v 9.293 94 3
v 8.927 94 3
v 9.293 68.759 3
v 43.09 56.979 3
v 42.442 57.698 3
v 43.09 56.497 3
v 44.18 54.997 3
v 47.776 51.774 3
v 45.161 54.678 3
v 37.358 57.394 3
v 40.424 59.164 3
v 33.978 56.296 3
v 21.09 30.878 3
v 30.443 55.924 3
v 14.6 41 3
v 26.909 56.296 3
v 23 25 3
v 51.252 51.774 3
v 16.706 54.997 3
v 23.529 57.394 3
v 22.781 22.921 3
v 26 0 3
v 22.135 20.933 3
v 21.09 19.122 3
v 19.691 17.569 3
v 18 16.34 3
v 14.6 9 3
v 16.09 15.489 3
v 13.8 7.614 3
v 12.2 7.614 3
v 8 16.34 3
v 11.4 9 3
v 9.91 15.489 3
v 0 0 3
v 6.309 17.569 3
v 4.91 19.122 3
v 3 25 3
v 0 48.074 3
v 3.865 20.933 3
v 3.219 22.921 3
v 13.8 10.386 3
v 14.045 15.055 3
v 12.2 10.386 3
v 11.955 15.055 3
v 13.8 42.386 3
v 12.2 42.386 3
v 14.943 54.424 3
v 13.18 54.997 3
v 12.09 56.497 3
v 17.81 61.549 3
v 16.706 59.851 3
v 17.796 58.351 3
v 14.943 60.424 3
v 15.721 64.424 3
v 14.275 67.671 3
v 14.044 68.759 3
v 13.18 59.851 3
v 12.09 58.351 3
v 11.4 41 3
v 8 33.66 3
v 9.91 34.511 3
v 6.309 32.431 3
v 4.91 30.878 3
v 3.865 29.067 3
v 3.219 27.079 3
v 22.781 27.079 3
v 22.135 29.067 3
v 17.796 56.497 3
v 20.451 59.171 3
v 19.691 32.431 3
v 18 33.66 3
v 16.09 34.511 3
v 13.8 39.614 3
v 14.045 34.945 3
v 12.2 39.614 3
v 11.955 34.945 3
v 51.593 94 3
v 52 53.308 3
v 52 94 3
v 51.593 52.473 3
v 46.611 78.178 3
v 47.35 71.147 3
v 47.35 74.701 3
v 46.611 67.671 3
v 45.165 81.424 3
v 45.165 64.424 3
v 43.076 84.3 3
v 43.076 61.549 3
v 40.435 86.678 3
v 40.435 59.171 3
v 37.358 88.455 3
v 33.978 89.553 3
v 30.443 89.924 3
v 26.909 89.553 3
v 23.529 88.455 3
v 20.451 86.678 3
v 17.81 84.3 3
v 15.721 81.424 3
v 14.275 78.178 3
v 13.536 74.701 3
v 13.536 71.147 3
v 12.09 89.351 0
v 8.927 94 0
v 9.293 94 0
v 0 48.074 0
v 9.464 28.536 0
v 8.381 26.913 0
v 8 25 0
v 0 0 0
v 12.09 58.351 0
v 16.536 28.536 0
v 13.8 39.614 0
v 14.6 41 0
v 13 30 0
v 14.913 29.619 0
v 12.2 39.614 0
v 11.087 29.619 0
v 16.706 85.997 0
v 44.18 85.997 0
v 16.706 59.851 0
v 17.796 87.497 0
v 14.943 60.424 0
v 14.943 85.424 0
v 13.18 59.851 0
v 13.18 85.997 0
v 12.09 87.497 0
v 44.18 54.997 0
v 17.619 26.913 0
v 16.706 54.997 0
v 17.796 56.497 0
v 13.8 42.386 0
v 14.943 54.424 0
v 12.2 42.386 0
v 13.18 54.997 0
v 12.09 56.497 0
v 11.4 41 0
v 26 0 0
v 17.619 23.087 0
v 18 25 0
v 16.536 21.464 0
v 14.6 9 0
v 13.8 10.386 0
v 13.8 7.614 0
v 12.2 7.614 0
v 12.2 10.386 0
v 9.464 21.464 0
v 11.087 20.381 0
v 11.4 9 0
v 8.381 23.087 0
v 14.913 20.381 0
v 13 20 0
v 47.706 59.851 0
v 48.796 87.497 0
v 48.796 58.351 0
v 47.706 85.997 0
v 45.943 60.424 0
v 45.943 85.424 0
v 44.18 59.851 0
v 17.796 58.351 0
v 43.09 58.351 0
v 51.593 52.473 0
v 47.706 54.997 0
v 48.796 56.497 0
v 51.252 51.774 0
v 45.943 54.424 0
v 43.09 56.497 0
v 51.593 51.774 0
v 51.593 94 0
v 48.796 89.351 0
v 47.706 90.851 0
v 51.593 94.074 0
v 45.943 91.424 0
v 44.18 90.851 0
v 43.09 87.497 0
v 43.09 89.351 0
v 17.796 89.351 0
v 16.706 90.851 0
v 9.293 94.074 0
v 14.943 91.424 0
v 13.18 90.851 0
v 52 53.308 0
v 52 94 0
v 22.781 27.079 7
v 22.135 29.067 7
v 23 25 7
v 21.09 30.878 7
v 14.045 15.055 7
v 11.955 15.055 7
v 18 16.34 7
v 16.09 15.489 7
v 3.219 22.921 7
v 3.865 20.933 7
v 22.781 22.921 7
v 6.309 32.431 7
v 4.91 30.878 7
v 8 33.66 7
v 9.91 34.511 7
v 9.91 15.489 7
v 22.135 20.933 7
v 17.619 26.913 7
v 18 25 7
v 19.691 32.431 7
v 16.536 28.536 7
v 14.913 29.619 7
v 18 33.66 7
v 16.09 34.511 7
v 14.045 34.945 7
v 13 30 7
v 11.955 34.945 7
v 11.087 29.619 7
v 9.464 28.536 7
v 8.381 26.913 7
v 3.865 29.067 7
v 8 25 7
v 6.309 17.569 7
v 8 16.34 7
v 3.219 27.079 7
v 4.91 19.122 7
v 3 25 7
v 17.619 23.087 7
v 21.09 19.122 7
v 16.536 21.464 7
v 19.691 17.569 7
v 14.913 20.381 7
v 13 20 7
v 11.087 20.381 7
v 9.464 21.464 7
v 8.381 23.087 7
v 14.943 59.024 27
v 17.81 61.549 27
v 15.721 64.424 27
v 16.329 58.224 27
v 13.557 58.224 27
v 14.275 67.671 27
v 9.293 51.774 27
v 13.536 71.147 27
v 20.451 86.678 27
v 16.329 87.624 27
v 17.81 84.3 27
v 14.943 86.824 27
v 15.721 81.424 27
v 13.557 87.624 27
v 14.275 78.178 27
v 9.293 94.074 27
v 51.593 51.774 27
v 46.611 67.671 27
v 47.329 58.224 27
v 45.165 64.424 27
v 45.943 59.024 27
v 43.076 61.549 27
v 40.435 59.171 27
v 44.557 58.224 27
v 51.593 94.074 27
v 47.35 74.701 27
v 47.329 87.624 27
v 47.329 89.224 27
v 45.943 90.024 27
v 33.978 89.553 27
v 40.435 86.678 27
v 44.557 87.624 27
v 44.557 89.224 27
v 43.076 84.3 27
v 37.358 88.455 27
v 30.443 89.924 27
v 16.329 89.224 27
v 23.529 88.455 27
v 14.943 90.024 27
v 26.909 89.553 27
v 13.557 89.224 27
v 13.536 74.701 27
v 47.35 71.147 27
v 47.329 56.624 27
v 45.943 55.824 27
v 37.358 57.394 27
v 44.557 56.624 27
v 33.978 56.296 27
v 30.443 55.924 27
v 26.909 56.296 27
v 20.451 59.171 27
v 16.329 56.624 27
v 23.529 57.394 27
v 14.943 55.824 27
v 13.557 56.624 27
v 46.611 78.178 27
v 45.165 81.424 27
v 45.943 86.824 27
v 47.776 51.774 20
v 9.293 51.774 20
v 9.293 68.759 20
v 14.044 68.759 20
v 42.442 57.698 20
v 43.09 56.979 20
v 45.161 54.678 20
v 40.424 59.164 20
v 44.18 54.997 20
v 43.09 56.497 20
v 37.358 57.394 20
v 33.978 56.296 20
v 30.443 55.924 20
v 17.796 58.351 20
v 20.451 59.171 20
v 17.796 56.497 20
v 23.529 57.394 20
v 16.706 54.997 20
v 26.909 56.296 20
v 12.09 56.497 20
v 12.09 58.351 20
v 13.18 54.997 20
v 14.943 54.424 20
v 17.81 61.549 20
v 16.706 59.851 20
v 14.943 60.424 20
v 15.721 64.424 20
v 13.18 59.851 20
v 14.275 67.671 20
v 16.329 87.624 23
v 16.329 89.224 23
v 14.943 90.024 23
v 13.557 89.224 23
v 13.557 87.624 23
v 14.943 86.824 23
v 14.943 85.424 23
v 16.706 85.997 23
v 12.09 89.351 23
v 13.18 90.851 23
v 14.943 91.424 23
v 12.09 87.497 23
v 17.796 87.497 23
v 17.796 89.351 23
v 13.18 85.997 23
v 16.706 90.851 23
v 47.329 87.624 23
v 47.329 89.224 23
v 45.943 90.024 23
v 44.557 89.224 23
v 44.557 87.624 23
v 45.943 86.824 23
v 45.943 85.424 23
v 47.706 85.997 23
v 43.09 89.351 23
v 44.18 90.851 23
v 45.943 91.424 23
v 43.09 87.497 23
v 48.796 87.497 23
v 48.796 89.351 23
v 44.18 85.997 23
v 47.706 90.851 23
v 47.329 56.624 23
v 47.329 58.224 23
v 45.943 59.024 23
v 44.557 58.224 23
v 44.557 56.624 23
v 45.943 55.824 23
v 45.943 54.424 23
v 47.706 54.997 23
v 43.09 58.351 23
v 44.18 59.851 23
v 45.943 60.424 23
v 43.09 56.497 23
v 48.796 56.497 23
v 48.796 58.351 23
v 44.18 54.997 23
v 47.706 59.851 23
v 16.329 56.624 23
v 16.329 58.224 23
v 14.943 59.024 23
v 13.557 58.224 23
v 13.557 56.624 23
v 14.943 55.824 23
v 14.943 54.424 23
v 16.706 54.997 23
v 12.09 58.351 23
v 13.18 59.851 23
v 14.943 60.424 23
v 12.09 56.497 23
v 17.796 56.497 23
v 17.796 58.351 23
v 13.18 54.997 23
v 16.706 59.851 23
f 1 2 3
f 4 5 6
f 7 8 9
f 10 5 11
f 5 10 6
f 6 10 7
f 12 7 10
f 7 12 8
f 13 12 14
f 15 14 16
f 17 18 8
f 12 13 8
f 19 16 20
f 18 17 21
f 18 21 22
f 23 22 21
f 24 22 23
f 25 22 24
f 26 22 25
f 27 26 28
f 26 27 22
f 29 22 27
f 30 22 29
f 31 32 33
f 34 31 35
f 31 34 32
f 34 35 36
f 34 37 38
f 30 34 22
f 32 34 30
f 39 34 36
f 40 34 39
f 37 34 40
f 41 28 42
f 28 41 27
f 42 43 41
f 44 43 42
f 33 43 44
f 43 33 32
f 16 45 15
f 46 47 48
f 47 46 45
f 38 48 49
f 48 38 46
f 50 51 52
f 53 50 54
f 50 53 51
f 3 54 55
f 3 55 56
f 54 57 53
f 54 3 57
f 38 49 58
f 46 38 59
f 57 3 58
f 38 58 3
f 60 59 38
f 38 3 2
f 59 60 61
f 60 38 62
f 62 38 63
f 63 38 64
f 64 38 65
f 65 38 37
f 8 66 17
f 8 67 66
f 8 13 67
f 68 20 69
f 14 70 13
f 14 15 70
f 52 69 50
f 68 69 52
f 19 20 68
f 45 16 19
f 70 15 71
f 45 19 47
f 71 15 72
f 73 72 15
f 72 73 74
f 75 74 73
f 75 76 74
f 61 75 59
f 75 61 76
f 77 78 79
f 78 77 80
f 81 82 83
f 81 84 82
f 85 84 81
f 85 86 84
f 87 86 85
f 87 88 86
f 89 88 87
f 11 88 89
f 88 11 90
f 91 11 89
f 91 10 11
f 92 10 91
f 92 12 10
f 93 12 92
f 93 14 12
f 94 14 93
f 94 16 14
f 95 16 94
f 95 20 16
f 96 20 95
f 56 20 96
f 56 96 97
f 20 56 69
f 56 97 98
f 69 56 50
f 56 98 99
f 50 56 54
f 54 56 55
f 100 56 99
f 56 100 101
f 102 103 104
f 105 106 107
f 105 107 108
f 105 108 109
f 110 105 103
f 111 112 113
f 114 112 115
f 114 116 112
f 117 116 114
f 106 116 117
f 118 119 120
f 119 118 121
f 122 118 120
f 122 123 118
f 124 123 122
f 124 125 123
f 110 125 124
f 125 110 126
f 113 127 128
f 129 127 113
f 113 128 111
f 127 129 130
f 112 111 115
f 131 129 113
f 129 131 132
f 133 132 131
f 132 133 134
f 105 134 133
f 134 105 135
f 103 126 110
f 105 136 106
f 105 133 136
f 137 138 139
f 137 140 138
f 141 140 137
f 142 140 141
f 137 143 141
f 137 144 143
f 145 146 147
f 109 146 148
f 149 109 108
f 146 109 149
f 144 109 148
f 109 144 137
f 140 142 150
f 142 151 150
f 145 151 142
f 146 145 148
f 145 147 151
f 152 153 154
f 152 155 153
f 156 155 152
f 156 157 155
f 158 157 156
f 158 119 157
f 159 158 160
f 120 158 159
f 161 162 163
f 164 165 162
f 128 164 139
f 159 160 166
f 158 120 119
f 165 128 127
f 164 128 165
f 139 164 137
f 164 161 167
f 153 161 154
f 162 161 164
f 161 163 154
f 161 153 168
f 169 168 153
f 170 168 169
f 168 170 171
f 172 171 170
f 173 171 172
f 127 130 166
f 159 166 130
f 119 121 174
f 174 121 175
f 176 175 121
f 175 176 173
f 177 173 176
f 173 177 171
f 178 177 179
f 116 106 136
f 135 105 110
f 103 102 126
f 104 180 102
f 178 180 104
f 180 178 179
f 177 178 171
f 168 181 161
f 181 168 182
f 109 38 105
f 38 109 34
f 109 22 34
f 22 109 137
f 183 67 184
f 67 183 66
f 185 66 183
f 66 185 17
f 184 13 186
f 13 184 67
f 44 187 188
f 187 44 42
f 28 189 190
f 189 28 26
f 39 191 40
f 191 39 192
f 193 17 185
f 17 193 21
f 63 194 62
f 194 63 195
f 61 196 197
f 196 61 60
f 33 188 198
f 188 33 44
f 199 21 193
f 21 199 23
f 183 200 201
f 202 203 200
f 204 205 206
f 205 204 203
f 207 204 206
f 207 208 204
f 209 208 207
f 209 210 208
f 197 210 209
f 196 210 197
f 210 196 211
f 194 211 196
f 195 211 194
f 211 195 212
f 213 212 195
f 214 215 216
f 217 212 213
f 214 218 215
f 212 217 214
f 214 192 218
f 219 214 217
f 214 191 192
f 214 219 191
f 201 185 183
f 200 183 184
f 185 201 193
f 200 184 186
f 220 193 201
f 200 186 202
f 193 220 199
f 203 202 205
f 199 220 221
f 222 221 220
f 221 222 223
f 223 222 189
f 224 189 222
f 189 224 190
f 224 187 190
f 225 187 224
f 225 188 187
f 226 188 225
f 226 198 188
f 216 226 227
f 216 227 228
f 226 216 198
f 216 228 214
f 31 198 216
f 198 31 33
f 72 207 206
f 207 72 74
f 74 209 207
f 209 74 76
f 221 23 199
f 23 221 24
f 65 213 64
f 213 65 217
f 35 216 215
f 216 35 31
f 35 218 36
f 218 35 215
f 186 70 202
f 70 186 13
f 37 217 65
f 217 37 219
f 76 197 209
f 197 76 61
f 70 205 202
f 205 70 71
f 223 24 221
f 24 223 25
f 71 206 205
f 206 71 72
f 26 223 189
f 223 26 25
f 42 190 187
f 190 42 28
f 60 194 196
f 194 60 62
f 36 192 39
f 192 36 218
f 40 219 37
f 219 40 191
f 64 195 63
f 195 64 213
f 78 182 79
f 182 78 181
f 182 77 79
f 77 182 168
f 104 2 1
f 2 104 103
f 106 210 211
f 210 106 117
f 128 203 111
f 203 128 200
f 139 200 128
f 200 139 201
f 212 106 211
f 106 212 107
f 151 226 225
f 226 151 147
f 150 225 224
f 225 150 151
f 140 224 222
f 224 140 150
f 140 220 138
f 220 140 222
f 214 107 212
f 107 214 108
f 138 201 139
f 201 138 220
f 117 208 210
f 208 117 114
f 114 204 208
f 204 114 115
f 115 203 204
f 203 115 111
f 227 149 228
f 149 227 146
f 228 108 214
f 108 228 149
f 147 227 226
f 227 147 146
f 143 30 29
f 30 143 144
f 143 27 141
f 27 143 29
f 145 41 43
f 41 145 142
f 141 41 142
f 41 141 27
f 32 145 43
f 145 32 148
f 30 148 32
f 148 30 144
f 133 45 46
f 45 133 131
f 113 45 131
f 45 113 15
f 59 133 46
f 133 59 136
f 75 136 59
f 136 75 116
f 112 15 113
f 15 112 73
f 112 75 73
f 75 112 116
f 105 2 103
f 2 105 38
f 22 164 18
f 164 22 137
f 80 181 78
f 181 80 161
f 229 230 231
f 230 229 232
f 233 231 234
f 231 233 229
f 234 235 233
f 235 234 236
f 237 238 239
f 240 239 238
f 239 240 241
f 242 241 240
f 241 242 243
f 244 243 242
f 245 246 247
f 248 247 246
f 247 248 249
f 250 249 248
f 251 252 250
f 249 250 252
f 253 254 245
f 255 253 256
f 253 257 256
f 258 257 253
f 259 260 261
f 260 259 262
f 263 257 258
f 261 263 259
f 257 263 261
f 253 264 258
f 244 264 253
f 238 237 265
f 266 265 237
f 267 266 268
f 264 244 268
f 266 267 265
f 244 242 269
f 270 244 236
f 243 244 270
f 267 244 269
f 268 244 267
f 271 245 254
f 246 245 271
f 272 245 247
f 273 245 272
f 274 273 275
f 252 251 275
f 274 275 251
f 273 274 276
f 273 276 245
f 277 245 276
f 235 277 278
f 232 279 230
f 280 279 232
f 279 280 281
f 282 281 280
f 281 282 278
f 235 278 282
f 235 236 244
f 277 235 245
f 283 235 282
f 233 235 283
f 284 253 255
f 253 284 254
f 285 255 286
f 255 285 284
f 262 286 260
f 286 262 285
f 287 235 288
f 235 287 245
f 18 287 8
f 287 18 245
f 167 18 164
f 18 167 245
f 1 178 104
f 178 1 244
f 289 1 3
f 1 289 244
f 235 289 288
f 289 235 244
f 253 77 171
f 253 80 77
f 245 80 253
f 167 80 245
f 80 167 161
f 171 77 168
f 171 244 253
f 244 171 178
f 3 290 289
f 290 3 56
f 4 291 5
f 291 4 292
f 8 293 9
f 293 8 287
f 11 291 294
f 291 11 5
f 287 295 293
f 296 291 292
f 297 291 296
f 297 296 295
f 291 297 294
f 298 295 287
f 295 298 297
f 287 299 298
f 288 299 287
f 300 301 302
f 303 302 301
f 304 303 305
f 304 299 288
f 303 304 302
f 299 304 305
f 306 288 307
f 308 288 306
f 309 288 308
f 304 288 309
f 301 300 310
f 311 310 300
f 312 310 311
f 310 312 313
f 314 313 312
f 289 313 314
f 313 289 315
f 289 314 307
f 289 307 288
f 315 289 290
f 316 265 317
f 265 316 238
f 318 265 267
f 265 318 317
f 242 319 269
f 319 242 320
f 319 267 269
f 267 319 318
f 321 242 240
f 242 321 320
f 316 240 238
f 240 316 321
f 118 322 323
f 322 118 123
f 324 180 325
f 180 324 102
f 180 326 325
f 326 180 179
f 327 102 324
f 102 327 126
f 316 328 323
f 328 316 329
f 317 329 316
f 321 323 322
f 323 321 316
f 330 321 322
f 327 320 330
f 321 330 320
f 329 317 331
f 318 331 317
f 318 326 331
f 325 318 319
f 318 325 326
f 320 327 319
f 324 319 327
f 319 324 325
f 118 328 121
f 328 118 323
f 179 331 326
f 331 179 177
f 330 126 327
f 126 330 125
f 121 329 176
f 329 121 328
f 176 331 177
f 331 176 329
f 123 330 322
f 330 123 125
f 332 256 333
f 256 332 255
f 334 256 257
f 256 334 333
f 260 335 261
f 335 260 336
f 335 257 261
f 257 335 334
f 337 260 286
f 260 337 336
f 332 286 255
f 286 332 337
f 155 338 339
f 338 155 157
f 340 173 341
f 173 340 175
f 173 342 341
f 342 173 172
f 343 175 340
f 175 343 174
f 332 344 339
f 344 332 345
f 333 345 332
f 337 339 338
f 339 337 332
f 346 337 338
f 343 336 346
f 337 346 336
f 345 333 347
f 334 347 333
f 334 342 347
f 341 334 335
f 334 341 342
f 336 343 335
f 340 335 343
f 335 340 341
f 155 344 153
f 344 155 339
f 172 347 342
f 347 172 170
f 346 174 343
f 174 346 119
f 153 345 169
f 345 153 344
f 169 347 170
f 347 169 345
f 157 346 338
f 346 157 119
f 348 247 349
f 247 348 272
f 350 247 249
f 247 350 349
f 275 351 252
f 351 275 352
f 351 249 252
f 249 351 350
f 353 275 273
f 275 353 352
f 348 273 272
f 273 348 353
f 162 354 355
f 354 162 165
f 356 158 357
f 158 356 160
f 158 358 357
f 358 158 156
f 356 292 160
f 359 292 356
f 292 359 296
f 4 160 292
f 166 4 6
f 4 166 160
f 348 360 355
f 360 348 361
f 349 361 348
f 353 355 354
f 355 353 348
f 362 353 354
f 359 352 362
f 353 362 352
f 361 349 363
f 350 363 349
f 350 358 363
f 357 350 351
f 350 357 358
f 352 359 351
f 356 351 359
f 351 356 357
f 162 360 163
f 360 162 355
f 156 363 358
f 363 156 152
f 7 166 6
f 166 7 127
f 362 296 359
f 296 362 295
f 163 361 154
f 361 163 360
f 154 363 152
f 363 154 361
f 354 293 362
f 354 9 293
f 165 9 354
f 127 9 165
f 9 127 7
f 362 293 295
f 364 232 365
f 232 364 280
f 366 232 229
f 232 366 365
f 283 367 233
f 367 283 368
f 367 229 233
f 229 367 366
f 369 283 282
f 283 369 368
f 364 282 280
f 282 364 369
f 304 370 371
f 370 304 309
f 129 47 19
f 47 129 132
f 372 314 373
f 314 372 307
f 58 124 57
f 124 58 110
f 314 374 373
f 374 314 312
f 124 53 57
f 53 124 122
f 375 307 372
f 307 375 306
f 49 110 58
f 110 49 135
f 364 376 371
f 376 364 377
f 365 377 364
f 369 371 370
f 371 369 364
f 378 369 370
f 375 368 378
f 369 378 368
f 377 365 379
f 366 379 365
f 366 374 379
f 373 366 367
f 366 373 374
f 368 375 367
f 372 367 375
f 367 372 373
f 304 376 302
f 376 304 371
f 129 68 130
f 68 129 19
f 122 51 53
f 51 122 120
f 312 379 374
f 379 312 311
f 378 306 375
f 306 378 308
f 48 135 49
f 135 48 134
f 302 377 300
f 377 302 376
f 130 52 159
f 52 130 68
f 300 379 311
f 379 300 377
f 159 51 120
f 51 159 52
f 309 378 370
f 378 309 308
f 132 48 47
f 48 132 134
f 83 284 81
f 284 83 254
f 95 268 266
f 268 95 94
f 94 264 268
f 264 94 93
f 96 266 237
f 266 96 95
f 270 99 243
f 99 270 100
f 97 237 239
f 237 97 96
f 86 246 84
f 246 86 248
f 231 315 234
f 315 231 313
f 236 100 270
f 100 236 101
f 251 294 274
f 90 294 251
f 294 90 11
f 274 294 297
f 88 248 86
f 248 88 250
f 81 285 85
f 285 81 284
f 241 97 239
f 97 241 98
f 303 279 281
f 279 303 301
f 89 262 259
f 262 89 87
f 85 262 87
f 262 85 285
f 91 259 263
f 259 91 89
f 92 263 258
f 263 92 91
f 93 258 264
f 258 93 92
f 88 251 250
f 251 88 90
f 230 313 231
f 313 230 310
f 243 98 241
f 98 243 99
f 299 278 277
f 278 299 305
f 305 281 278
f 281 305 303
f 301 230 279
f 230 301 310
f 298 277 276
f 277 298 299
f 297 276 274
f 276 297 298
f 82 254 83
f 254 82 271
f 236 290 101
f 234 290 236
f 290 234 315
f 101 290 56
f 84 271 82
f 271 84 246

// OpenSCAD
arm_angle = 70;
arm_rotation = 90 - arm_angle;
distance_between_gears = 51;
top = 0;
difference(){
  union (){
    difference(){
      union(){
        cube ([26,50,3]); // block like original
	     translate([13,25,0]){cylinder(h = 7, r = 10);} //bushing
        translate([0,0,0]){cube([52,94,3]);} // arm to stepper
      }
      // sklight mount holes
      translate([13,25,0]){
        cylinder(h = 50, r = 5);
        translate([0,-16,0]){cylinder(h = 50, r = 1.6 + (top * 2));}
        translate([0,16,0]){cylinder(h = 50, r = 1.6 + (top * 2));}
      }
      // taper arm to stepper
      translate([-20,50,0]){
        rotate([0,0,-11]){
          cube ([20,90,10]);
        }
      }
      // taper arm to stepper
      translate([26,0,0]){
        rotate([0,0,-26]){
          cube ([30,90,10]);
        }
      }
    }
    difference(){
      // Block for stepper gear
      translate([13,25,0]){
        rotate([0,0,arm_angle]){
          translate([distance_between_gears,0,0]){
            rotate([0,0,arm_rotation]){
              translate([-21.15,-21.15,0]){
                cube([42.3,42.3,27]);
              }     
            }
          }
        }
      }
      translate([13,25,0]){cylinder(h = 20, r = 44);}
    }
  }
  //stepper bolts
  translate([13,25,0]){
    rotate([0,0,arm_angle]){
      translate([distance_between_gears,0,0]){
          rotate([0,0,arm_rotation]){
              translate([15.5,15.5,0]){
                cylinder(h=50, r=1.6);
                if ( top == 0 ){
                  cylinder(h=23, r=3);
                }
              }
              translate([15.5,-15.5,0]){
                cylinder(h=50, r=1.6);
                if ( top == 0 ){
                  cylinder(h=23, r=3);
                }
              }
              translate([-15.5,-15.5,0]){
                cylinder(h=50, r=1.6);
                if ( top == 0 ){
                  cylinder(h=23, r=3);
                }
              }
              translate([-15.5,15.5,0]){
                cylinder(h=50, r=1.6);
                if ( top == 0 ){
                  cylinder(h=23, r=3);
                }
              }            
         }
     }
   }
 }
 //lop of build up if top
 if (top == 1){
   translate([0,0,3]){
     cube([100,100,50]);
   }
 }
 //Hole for stepper gear
 translate([13,25,(1 - top) * 3]){
   rotate([0,0,arm_angle]){
      translate([distance_between_gears,0,0]){
        rotate([0,0,arm_rotation]){
          cylinder(h=50, r = 17);
        }
      }
   }
 }
}
